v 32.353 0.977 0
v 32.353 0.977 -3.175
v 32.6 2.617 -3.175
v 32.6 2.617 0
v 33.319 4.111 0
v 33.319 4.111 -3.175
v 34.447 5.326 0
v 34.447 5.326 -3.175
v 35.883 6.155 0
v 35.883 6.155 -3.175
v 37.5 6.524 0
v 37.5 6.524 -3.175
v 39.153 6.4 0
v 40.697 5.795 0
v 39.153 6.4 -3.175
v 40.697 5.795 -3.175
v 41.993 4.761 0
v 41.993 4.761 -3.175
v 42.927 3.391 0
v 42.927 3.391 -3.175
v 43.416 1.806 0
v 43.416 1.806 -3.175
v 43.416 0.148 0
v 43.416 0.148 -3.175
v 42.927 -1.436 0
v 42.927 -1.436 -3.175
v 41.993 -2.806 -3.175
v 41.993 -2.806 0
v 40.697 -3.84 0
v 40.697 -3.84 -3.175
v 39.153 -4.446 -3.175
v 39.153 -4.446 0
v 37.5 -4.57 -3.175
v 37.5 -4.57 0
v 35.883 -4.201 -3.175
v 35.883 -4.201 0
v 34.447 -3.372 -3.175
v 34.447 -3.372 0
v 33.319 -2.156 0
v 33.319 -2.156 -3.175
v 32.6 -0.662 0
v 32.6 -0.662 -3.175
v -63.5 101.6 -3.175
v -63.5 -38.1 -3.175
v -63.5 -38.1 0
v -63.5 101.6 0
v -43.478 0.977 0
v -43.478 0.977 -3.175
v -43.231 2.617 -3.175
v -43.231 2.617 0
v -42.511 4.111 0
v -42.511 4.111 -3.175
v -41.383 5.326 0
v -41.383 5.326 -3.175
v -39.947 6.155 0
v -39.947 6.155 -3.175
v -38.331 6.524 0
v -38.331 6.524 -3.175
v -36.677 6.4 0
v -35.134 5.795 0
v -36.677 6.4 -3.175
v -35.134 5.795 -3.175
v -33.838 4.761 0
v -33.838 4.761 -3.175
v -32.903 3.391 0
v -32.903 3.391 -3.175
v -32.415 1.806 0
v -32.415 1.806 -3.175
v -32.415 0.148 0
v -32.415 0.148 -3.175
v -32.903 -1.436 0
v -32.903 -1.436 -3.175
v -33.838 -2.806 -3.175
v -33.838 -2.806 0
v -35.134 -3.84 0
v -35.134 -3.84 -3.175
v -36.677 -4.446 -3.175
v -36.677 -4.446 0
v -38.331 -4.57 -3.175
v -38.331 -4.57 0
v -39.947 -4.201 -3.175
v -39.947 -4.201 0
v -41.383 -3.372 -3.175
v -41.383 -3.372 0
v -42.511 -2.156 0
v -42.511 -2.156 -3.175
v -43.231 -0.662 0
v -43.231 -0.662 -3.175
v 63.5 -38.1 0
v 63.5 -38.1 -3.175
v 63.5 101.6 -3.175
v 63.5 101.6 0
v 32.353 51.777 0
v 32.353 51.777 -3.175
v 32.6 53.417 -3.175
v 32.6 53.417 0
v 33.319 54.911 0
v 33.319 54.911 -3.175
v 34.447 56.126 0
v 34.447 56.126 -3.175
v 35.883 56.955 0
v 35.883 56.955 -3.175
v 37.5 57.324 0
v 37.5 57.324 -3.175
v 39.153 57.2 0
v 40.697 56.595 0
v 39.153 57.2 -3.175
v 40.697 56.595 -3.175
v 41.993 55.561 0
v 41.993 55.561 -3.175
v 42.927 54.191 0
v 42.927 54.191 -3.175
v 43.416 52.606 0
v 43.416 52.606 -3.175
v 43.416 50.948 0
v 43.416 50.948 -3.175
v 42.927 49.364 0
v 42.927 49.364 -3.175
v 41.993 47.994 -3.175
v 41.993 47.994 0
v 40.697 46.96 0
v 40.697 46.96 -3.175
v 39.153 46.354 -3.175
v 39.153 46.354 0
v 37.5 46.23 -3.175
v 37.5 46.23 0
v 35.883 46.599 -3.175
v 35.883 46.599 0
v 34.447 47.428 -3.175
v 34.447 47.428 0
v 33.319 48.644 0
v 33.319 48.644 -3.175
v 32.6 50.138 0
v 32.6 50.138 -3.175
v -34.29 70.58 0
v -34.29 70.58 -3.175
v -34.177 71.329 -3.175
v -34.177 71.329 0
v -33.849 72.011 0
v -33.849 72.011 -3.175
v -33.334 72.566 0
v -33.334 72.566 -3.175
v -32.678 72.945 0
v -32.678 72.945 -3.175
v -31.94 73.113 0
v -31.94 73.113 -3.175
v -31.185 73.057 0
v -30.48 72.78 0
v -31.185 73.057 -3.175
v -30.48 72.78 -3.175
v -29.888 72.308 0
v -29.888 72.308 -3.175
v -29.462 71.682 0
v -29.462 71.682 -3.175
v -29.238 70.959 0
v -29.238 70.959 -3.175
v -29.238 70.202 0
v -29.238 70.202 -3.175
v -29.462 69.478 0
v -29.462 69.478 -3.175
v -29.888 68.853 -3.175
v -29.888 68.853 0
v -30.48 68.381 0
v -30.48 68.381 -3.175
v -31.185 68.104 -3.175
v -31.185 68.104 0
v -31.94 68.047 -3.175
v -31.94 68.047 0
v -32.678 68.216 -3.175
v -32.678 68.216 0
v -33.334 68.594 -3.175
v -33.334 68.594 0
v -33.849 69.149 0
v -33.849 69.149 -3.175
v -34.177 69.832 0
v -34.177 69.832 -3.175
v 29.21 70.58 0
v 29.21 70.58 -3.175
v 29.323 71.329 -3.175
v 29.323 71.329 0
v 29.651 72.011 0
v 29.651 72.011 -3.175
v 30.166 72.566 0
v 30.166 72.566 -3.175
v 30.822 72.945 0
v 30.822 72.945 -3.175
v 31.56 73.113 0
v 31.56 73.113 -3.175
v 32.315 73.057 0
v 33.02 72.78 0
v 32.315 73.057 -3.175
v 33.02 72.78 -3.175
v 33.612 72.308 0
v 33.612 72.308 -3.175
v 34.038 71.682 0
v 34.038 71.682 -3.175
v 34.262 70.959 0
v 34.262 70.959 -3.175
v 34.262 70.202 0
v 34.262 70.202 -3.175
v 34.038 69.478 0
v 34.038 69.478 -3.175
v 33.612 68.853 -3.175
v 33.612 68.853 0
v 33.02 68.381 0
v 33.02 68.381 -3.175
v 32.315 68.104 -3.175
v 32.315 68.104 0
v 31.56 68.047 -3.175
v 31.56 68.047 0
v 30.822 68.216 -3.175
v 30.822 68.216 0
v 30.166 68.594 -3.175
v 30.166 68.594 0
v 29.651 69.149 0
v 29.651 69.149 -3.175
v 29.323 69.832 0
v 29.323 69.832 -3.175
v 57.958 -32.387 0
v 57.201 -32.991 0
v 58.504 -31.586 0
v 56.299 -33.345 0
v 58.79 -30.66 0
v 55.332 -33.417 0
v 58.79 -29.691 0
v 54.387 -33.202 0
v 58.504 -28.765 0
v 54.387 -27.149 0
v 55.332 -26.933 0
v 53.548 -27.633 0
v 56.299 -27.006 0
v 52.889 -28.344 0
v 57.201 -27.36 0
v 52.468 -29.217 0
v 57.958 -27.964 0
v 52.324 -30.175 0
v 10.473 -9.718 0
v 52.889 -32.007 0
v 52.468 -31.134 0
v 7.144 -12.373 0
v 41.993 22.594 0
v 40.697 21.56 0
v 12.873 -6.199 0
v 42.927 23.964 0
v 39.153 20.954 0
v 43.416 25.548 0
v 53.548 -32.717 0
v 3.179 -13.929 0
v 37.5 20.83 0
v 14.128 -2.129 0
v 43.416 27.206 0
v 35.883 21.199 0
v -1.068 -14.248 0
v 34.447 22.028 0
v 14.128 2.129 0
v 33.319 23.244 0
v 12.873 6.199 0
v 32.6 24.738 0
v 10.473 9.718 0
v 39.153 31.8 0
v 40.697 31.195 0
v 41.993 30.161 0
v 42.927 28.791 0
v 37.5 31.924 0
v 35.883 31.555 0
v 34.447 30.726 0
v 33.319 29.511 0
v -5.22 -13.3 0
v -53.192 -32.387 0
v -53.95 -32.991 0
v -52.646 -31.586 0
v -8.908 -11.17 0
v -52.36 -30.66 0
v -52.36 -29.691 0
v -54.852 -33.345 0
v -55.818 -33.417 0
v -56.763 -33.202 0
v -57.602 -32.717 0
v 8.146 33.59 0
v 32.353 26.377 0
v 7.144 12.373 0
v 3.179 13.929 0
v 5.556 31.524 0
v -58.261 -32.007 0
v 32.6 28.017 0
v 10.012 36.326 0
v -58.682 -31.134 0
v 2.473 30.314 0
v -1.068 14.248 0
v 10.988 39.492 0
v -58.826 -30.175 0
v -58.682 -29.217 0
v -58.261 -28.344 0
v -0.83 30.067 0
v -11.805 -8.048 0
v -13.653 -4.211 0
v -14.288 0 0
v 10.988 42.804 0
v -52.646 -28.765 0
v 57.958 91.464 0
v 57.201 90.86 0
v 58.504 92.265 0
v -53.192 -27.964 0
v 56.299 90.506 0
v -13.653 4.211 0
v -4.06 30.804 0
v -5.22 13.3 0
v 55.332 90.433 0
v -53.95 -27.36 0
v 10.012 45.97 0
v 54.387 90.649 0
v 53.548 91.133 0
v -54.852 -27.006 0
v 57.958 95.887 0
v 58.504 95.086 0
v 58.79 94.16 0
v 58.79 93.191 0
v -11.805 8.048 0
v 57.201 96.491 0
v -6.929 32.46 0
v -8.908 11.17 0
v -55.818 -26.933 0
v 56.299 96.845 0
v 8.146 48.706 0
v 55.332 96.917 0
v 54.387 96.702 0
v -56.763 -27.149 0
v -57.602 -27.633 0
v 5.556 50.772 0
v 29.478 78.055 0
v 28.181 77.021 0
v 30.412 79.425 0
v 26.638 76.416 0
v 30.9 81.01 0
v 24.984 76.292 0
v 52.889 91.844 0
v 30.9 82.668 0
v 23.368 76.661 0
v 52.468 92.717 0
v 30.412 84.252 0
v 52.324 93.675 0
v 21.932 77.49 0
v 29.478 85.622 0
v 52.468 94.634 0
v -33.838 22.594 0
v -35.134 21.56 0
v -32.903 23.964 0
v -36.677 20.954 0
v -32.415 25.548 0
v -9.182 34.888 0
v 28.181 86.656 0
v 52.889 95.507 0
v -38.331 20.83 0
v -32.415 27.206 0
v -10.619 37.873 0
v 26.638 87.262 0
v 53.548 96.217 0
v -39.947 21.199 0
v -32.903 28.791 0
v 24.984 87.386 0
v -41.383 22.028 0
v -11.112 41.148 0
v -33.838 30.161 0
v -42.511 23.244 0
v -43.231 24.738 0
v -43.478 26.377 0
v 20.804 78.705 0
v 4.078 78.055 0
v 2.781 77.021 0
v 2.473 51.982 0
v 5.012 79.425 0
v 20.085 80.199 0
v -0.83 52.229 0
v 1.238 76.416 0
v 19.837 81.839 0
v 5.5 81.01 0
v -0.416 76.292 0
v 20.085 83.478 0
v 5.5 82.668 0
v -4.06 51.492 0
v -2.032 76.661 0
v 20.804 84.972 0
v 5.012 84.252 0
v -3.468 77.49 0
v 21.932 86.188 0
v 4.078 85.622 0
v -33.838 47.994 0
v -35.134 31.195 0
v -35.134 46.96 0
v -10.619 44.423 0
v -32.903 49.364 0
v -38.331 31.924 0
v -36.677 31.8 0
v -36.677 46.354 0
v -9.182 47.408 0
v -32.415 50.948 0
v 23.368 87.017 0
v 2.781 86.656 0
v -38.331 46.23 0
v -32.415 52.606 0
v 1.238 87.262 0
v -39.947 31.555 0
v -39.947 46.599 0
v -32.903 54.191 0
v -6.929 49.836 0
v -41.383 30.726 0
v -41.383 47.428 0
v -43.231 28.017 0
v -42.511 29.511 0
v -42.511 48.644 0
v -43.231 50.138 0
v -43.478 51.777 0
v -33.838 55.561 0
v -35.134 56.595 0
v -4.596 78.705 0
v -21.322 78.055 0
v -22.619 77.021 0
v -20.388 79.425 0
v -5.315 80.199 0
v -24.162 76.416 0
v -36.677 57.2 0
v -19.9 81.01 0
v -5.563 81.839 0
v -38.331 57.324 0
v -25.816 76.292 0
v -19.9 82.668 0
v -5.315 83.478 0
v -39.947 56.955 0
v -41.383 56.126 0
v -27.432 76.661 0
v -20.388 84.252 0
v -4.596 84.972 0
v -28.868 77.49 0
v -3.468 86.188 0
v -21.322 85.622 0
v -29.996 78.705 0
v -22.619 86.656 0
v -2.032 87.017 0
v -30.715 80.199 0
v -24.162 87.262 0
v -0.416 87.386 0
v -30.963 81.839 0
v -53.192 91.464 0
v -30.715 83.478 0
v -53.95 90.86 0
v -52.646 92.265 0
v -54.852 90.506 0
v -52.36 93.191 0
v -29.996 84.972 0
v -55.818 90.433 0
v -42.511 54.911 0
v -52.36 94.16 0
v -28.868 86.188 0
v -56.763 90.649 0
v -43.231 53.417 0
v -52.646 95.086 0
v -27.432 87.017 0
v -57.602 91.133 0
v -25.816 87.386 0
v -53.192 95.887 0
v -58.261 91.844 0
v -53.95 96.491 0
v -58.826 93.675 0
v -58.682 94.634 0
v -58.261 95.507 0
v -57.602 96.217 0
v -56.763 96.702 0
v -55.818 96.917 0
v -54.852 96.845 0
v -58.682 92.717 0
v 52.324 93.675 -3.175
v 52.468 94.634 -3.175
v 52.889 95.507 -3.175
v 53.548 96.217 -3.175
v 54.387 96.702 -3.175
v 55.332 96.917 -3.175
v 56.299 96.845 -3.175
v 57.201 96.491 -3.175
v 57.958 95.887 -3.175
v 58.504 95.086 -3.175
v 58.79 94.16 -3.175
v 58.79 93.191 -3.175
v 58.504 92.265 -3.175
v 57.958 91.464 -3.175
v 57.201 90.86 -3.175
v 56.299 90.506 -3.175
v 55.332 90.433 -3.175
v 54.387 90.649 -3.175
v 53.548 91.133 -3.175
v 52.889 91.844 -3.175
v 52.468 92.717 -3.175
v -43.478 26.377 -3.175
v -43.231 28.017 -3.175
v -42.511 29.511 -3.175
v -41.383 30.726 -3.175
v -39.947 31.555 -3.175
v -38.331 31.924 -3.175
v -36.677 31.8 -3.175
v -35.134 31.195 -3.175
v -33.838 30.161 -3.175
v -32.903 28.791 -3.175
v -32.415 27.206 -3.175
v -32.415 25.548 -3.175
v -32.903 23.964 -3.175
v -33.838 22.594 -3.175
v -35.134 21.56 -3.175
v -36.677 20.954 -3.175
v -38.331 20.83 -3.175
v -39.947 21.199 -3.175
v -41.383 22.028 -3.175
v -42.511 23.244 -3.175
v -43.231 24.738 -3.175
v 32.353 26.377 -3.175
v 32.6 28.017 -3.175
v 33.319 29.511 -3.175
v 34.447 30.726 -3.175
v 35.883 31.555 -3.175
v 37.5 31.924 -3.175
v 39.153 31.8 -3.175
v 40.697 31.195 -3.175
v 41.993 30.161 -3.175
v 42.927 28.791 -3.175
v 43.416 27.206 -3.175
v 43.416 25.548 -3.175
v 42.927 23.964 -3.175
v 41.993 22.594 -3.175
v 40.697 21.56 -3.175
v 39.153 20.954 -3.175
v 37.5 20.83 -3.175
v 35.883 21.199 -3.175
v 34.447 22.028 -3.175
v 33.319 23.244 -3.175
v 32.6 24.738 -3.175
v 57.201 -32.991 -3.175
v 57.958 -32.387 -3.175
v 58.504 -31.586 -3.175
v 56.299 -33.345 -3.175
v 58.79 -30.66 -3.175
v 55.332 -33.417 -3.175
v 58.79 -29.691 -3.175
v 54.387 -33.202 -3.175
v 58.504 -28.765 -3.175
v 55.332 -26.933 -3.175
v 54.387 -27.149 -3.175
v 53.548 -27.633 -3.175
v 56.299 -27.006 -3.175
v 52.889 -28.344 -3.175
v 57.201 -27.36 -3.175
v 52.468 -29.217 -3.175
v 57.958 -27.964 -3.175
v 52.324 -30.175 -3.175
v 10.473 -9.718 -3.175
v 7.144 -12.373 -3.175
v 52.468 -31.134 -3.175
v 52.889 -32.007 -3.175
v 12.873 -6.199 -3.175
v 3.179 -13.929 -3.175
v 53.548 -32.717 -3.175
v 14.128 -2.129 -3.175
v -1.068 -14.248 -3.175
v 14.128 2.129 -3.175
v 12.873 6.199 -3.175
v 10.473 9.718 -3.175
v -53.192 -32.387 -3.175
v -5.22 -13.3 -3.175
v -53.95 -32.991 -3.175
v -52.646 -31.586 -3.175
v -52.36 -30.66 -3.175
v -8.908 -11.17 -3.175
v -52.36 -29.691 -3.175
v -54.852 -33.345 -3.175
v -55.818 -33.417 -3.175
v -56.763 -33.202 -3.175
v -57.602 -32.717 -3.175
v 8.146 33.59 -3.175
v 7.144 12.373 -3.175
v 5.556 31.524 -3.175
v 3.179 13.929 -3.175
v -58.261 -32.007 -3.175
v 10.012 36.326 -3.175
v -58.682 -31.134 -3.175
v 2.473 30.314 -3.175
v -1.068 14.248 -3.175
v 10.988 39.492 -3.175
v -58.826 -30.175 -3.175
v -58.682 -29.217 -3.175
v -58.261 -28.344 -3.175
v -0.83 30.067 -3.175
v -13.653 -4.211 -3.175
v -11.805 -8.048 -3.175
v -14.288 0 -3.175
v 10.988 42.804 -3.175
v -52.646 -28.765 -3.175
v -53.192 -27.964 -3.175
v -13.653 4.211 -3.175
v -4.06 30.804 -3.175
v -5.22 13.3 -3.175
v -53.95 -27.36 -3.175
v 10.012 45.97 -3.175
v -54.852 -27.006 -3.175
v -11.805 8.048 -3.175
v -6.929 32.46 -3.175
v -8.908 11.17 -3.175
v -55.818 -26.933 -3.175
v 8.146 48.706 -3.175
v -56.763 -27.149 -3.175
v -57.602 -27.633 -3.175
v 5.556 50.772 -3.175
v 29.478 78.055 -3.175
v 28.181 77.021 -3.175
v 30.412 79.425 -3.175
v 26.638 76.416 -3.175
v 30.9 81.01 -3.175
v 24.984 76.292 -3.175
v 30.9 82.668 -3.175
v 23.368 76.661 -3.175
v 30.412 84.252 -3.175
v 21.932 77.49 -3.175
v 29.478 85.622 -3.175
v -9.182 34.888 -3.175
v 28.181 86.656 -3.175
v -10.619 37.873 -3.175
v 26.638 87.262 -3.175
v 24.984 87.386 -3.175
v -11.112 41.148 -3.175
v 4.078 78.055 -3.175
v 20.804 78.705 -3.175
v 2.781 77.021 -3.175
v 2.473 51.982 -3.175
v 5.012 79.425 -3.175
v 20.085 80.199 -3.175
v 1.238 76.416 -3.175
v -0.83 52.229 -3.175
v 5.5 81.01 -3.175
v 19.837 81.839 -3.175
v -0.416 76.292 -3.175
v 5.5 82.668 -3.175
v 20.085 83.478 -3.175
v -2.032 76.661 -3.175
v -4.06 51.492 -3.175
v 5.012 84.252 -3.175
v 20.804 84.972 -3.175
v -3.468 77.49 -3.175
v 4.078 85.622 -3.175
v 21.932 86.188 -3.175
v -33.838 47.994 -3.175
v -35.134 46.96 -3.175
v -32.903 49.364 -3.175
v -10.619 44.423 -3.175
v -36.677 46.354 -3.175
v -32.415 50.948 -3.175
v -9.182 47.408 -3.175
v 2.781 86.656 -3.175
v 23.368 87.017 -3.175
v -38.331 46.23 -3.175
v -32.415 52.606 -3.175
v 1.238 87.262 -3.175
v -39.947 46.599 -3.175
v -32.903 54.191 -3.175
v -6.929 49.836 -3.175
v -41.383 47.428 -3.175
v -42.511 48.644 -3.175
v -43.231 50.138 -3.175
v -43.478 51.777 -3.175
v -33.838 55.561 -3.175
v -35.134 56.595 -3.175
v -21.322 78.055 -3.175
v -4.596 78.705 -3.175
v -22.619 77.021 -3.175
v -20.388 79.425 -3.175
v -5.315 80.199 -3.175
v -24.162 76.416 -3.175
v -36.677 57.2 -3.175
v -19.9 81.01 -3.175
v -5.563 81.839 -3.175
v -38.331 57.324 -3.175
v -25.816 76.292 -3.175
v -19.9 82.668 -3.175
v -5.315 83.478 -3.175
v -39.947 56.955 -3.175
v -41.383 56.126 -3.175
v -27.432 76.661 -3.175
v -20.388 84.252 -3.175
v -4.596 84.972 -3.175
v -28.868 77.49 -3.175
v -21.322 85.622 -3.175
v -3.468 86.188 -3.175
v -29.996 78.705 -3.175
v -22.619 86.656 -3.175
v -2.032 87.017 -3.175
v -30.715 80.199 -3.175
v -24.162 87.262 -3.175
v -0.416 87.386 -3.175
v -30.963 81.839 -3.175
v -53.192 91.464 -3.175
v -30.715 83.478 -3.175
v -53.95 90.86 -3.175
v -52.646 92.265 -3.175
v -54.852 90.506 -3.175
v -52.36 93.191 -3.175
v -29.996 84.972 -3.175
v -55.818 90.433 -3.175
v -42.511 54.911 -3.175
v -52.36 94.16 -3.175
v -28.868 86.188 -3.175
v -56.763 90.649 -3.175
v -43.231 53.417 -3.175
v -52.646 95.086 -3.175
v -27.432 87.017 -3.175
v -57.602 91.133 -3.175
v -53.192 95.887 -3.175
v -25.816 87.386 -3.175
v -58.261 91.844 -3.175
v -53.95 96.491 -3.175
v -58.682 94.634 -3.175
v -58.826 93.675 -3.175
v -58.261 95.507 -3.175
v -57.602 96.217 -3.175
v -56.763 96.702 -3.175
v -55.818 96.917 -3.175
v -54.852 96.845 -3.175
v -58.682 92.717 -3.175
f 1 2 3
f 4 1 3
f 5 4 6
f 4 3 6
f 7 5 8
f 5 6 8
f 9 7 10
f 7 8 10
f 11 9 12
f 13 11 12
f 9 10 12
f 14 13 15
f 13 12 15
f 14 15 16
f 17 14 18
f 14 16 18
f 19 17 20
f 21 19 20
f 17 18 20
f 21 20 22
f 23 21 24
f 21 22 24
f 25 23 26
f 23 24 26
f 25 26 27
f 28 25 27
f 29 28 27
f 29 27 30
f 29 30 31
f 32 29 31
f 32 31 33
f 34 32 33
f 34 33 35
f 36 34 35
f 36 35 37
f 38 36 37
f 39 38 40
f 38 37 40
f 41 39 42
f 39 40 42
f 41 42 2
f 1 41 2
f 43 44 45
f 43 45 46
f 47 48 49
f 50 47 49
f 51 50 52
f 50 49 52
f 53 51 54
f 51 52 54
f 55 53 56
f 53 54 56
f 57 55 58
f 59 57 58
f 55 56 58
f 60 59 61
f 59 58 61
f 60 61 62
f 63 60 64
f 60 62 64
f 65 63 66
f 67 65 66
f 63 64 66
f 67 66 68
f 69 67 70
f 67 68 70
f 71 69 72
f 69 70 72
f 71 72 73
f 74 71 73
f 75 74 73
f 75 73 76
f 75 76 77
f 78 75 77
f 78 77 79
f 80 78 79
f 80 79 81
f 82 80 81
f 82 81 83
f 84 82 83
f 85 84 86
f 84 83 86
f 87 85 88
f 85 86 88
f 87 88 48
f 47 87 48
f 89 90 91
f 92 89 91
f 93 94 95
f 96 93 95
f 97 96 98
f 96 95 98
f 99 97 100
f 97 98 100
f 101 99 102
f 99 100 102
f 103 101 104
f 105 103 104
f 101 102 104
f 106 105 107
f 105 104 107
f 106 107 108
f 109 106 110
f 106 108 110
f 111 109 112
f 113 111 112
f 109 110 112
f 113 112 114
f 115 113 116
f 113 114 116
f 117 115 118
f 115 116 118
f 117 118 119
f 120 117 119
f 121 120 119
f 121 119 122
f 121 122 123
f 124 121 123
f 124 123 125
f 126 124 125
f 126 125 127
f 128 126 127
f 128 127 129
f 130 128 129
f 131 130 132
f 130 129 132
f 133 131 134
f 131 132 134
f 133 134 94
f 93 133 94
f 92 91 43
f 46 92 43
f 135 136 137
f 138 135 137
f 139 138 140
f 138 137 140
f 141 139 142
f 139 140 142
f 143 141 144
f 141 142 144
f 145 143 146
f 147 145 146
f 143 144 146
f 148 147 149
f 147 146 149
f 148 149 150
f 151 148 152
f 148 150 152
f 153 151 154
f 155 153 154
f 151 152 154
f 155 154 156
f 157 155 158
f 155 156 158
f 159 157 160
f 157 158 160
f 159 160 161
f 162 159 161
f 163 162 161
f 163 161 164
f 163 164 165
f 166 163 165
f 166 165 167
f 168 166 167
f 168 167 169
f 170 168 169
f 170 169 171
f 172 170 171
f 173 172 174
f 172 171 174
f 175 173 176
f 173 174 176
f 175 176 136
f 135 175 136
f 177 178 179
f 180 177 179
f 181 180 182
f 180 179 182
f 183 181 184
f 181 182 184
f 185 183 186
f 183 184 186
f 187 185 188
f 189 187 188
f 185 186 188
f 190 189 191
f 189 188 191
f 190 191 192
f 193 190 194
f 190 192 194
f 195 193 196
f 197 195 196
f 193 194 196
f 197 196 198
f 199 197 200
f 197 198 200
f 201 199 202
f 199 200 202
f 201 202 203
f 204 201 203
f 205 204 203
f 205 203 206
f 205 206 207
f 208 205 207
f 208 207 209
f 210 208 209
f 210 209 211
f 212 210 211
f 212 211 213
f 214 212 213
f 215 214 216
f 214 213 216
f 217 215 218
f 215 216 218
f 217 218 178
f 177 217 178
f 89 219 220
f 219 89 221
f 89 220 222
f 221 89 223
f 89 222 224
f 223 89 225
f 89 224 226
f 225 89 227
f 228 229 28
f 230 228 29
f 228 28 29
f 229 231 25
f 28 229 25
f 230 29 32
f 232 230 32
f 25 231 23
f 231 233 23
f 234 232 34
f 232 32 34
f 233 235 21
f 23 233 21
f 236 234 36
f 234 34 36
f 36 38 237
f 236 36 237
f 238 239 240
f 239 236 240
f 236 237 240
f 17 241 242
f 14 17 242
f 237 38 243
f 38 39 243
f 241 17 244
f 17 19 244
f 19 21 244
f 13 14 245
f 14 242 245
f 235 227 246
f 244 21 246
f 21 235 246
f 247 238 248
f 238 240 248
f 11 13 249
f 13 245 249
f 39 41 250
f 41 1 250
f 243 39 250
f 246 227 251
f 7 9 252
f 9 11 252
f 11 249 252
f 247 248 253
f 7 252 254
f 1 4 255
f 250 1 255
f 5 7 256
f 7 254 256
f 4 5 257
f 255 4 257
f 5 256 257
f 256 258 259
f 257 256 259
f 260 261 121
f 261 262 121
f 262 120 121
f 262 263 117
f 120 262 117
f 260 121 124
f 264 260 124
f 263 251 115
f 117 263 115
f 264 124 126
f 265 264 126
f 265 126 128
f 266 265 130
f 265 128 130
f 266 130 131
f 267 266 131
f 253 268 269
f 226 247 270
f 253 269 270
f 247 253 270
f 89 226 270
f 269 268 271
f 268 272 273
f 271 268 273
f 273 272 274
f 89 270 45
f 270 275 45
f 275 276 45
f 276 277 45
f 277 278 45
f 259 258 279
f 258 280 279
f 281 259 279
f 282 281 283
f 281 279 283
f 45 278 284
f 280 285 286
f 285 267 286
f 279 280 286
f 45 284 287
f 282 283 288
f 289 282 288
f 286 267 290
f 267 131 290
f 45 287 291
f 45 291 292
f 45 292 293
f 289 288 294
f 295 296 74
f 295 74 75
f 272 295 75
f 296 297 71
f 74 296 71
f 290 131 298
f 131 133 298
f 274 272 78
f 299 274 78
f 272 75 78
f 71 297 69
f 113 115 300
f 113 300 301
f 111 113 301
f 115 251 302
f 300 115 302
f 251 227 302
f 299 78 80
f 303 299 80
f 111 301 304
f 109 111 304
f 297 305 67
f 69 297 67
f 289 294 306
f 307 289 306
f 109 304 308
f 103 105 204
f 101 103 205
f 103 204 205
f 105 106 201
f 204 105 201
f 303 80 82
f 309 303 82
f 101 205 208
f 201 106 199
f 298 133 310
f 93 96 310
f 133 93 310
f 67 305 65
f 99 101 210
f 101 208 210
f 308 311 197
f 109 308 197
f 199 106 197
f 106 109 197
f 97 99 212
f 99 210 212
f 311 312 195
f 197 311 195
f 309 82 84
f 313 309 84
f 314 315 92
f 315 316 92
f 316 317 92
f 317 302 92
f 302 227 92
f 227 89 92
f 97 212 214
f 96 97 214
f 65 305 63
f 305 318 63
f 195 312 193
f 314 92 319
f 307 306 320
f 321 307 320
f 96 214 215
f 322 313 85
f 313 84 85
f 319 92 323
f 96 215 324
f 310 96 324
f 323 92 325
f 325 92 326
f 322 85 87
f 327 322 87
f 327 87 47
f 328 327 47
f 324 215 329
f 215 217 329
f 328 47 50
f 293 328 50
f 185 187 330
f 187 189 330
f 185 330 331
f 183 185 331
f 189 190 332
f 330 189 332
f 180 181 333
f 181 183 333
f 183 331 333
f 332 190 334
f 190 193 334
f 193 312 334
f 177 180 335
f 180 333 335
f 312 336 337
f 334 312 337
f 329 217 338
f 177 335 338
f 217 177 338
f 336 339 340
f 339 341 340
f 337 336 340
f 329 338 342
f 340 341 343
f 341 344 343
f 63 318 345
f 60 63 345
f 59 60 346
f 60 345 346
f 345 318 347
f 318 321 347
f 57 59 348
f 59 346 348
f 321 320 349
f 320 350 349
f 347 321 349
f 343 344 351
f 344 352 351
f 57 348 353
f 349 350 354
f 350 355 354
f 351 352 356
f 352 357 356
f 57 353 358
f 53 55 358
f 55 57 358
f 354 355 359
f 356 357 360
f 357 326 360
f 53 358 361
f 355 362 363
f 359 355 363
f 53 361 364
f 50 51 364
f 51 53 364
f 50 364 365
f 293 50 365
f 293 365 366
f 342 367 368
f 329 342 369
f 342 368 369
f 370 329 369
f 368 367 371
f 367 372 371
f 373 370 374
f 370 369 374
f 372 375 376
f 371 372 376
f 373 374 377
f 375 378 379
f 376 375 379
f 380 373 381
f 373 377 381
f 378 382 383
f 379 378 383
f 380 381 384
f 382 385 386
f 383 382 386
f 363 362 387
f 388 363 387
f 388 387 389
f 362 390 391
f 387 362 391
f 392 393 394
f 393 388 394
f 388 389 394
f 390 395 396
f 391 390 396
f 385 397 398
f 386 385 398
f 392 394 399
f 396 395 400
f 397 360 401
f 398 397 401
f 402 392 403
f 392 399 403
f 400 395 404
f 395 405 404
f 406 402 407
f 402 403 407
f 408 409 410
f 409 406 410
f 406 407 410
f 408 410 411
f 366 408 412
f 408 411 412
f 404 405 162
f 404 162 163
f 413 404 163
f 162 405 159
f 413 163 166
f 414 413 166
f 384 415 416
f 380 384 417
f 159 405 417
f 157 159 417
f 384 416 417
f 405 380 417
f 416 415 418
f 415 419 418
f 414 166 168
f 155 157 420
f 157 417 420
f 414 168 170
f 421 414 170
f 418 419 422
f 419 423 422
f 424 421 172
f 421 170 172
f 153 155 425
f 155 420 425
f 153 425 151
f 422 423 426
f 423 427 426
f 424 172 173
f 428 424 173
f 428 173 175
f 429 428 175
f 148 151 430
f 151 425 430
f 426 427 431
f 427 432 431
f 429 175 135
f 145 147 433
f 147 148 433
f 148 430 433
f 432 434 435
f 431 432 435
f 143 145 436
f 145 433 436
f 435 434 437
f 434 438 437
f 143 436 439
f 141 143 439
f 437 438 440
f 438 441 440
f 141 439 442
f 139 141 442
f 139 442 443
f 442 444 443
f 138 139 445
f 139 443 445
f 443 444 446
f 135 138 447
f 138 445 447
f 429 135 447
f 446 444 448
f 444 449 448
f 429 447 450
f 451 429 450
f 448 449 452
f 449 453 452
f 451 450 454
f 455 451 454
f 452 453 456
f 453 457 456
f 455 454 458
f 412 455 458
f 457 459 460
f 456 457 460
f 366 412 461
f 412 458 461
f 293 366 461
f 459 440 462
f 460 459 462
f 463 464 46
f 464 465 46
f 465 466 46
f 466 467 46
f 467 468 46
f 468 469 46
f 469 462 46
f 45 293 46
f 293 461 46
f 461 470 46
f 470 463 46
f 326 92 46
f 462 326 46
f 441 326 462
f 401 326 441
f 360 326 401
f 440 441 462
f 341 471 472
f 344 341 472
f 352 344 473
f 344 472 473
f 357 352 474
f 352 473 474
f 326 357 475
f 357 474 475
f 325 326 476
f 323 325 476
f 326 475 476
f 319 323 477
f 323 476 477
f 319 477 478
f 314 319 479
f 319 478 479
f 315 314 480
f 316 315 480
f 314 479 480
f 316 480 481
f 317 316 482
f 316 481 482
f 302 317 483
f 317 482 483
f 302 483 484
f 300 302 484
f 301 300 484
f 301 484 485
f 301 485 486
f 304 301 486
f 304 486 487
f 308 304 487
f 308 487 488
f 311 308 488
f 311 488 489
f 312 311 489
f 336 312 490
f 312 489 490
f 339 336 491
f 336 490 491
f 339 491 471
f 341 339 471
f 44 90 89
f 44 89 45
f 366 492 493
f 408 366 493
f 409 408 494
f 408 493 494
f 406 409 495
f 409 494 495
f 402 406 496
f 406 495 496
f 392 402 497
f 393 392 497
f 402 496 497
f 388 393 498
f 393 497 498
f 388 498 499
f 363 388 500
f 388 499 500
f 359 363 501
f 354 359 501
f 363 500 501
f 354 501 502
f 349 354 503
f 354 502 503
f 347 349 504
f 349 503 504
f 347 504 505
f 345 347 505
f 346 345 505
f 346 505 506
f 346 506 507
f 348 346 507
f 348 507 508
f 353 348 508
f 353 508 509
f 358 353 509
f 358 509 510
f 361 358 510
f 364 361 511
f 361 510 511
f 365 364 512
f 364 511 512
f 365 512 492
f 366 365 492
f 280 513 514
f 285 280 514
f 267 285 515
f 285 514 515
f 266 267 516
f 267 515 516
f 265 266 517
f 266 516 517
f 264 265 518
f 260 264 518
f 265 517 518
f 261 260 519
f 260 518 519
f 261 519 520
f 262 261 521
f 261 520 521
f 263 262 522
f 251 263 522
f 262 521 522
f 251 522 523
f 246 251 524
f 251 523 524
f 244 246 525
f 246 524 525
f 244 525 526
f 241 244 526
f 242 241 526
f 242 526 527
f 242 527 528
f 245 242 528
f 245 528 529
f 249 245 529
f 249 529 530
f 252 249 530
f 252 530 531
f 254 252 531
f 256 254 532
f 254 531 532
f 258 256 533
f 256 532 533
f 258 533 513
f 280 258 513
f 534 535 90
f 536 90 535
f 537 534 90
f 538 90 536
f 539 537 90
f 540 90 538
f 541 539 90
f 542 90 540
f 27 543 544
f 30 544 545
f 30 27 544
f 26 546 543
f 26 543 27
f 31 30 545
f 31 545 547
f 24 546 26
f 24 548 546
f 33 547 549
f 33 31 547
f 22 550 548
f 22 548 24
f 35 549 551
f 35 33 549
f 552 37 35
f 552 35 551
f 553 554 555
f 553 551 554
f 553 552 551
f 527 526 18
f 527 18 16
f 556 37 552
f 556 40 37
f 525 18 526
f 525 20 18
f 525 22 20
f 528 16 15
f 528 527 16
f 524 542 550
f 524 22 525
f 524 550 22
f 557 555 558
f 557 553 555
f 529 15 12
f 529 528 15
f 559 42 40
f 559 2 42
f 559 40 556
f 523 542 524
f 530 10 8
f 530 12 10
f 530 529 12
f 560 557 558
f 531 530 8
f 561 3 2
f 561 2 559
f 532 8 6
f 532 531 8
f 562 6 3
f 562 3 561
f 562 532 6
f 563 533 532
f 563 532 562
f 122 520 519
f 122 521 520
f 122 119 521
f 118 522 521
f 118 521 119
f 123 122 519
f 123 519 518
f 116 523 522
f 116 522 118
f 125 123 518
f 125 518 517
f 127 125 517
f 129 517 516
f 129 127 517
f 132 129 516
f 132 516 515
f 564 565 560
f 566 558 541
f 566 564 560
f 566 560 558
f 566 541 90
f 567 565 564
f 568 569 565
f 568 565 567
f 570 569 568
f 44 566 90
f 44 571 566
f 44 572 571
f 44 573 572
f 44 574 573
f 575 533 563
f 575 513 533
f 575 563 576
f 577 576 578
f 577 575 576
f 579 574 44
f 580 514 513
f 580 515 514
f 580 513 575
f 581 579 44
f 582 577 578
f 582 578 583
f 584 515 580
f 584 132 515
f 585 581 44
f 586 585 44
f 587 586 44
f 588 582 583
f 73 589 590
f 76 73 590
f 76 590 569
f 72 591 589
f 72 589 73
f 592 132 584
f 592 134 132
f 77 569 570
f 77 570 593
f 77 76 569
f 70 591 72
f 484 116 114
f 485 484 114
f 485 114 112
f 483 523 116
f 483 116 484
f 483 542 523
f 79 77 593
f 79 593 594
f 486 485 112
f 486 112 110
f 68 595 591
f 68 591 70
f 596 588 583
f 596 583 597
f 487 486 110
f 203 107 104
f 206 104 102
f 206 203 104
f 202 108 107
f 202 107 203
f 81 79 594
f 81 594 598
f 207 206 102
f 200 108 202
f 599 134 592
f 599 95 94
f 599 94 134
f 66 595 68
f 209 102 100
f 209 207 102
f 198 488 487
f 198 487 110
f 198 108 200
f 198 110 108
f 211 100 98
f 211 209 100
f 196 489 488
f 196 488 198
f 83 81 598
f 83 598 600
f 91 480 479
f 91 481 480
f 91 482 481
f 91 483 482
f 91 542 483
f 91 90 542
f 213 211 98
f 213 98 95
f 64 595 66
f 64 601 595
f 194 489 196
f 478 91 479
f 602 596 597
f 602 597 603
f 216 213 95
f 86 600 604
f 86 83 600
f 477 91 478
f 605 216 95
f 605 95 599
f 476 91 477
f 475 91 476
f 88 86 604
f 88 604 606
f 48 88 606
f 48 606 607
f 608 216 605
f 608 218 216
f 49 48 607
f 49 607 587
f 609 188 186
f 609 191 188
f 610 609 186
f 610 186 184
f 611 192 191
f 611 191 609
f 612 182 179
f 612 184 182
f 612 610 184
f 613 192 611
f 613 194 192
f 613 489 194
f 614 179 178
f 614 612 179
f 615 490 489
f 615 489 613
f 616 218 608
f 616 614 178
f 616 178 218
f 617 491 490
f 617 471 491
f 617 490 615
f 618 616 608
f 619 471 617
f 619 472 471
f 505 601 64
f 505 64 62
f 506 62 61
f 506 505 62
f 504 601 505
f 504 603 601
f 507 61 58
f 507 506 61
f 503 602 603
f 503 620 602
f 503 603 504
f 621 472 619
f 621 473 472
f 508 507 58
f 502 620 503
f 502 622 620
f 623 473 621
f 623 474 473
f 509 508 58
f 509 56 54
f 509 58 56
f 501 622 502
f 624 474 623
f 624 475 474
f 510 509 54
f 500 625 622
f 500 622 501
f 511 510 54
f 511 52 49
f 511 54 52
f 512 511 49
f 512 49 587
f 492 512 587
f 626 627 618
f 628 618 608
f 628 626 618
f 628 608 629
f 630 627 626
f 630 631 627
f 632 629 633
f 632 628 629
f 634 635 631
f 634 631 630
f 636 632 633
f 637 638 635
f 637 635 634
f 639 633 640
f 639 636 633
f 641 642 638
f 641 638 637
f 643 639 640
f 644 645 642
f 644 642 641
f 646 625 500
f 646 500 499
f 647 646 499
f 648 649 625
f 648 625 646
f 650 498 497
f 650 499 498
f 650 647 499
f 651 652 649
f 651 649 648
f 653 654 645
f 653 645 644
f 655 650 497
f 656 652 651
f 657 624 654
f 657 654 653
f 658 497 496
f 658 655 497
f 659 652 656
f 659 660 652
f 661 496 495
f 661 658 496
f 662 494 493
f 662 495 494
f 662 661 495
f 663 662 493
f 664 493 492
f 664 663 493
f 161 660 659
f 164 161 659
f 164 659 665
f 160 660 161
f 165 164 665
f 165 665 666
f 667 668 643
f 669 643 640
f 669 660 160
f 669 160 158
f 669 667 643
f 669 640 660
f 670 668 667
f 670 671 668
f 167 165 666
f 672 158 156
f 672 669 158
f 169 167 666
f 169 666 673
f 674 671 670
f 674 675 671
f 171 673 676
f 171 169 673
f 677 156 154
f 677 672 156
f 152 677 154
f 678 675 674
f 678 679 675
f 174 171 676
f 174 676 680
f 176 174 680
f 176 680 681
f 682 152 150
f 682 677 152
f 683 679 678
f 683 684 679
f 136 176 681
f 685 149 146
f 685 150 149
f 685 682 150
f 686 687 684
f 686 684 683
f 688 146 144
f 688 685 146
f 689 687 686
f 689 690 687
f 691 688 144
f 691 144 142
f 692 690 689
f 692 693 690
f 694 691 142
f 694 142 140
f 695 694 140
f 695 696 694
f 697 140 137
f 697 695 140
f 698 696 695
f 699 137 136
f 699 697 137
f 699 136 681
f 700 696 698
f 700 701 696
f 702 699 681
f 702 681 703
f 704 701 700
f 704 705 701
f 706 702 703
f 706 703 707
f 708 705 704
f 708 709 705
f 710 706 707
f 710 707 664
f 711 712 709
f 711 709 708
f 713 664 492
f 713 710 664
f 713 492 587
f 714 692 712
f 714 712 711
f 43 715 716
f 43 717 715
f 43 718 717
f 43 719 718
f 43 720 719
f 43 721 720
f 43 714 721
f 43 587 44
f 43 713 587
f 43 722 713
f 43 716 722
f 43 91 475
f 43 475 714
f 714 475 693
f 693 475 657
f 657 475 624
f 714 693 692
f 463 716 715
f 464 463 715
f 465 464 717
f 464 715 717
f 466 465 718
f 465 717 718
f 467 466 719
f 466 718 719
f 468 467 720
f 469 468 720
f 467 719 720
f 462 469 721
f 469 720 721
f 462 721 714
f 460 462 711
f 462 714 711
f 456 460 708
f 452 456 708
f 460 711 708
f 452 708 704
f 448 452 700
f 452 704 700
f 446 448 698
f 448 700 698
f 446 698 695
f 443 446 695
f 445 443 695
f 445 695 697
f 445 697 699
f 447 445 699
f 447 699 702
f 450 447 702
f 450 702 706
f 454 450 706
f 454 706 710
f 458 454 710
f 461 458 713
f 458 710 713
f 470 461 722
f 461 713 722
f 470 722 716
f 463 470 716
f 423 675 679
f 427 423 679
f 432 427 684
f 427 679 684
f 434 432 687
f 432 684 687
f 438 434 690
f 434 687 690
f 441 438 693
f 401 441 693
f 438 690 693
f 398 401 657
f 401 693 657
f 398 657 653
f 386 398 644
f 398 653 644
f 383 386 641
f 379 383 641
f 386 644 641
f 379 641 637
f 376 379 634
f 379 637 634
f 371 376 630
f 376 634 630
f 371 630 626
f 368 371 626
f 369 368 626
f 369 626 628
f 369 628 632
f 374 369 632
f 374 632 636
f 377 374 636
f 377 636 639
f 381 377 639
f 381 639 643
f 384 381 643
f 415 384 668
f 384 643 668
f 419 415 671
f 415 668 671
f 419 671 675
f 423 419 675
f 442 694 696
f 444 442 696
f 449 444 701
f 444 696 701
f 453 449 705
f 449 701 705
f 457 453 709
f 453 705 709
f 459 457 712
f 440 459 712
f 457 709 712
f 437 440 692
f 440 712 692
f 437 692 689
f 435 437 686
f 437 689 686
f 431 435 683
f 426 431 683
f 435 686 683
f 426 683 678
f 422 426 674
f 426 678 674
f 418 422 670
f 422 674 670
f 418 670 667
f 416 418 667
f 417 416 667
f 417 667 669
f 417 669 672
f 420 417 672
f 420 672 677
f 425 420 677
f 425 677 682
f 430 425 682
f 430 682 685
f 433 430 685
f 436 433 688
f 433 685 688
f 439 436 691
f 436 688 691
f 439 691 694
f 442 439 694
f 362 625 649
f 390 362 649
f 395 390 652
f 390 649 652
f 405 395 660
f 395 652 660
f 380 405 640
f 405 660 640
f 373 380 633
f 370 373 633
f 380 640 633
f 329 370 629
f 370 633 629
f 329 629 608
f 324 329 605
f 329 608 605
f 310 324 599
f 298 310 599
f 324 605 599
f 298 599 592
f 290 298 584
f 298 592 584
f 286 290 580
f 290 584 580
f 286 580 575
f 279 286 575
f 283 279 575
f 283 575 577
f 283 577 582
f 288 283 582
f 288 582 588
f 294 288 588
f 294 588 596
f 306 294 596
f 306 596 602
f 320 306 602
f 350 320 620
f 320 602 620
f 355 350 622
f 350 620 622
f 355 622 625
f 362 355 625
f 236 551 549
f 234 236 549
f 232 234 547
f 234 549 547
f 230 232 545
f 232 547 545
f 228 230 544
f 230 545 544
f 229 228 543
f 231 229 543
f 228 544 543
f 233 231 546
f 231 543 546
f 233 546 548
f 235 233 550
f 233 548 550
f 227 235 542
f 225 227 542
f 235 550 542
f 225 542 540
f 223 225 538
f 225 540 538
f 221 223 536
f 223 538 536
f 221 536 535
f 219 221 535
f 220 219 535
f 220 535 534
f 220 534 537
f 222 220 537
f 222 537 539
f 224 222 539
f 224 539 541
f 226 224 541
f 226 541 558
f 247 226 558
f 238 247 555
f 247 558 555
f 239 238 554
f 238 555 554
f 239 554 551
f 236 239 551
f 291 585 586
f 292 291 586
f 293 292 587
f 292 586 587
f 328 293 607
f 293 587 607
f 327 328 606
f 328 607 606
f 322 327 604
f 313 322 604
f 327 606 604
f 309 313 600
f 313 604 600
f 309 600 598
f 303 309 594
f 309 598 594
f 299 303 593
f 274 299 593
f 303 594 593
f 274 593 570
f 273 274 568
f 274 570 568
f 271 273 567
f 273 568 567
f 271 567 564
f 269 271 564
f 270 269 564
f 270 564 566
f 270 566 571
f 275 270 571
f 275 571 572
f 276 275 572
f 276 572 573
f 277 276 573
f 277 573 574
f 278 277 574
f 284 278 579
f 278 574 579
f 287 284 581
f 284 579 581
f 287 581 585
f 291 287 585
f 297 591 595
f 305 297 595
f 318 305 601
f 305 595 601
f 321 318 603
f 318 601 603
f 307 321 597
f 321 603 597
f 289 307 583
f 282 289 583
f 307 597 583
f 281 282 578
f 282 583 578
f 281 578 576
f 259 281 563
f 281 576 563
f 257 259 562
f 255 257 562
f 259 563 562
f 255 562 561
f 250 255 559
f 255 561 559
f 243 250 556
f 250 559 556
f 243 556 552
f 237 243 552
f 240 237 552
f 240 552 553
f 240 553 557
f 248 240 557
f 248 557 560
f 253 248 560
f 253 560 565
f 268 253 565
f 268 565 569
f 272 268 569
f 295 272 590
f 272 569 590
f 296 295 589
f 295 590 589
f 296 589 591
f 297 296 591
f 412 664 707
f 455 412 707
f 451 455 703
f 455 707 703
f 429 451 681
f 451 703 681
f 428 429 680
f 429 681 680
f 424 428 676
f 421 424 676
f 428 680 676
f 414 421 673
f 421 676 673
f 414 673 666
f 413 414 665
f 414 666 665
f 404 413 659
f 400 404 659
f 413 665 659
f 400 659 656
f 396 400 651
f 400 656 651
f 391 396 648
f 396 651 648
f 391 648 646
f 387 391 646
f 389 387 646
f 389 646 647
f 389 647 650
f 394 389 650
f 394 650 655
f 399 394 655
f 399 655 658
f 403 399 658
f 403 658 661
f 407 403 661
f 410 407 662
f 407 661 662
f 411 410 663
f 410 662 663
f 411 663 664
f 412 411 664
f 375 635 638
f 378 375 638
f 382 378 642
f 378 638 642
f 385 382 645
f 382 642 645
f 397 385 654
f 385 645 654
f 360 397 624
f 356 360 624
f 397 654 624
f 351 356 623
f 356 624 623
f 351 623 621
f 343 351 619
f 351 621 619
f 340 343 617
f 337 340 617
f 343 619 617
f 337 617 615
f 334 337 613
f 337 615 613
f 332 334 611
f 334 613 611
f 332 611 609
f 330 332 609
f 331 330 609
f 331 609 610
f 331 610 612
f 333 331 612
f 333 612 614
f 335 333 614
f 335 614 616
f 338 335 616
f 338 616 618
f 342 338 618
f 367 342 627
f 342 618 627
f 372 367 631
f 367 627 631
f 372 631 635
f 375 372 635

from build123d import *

# Parameters (mm, degrees)
SKETCH1_W           = 127
SKETCH1_H           = 139.7
SKETCH1_R           = 3.2512
SKETCH1_R_2         = 5.5626
SKETCH1_R_3         = 11.1125
SKETCH1_R_4         = 14.2875
SKETCH1_R_5         = 2.54
BOSS_EXTRUDE1_DEPTH = 3.175


with BuildPart() as part:
    # Sketch1 → Boss-Extrude1 (new body)
    with BuildSketch(Plane(origin=(0, 0, -3.175), x_dir=(-1, 0, 0), z_dir=(0, 0, -1))):
        with Locations((0, 31.75)):
            Rectangle(SKETCH1_W, SKETCH1_H)
        with Locations((55.5752, -30.1752)):
            Circle(SKETCH1_R, mode=Mode.SUBTRACT)
        with Locations((0, 81.8388)):
            Circle(SKETCH1_R_2, mode=Mode.SUBTRACT)
        with Locations((37.915221739, 51.777178589)):
            Circle(SKETCH1_R_2, mode=Mode.SUBTRACT)
        with Locations((-37.915221739, 0.977178589)):
            Circle(SKETCH1_R_2, mode=Mode.SUBTRACT)
        with Locations((-25.4, 81.8388)):
            Circle(SKETCH1_R_2, mode=Mode.SUBTRACT)
        with Locations((0, 41.148)):
            Circle(SKETCH1_R_3, mode=Mode.SUBTRACT)
        with Locations((-55.5752, 93.6752)):
            Circle(SKETCH1_R, mode=Mode.SUBTRACT)
        with Locations((-55.5752, -30.1752)):
            Circle(SKETCH1_R, mode=Mode.SUBTRACT)
        with Locations((55.5752, 93.6752)):
            Circle(SKETCH1_R, mode=Mode.SUBTRACT)
        Circle(SKETCH1_R_4, mode=Mode.SUBTRACT)
        with Locations((25.4, 81.8388)):
            Circle(SKETCH1_R_2, mode=Mode.SUBTRACT)
        with Locations((-37.915221739, 51.777178589)):
            Circle(SKETCH1_R_2, mode=Mode.SUBTRACT)
        with Locations((37.915221739, 0.977178589)):
            Circle(SKETCH1_R_2, mode=Mode.SUBTRACT)
        with Locations((37.915221739, 26.377178589)):
            Circle(SKETCH1_R_2, mode=Mode.SUBTRACT)
        with Locations((-37.915221739, 26.377178589)):
            Circle(SKETCH1_R_2, mode=Mode.SUBTRACT)
        with Locations((31.75, 70.58025)):
            Circle(SKETCH1_R_5, mode=Mode.SUBTRACT)
        with Locations((-31.75, 70.58025)):
            Circle(SKETCH1_R_5, mode=Mode.SUBTRACT)
    extrude(amount=-BOSS_EXTRUDE1_DEPTH)


solid = part.part
